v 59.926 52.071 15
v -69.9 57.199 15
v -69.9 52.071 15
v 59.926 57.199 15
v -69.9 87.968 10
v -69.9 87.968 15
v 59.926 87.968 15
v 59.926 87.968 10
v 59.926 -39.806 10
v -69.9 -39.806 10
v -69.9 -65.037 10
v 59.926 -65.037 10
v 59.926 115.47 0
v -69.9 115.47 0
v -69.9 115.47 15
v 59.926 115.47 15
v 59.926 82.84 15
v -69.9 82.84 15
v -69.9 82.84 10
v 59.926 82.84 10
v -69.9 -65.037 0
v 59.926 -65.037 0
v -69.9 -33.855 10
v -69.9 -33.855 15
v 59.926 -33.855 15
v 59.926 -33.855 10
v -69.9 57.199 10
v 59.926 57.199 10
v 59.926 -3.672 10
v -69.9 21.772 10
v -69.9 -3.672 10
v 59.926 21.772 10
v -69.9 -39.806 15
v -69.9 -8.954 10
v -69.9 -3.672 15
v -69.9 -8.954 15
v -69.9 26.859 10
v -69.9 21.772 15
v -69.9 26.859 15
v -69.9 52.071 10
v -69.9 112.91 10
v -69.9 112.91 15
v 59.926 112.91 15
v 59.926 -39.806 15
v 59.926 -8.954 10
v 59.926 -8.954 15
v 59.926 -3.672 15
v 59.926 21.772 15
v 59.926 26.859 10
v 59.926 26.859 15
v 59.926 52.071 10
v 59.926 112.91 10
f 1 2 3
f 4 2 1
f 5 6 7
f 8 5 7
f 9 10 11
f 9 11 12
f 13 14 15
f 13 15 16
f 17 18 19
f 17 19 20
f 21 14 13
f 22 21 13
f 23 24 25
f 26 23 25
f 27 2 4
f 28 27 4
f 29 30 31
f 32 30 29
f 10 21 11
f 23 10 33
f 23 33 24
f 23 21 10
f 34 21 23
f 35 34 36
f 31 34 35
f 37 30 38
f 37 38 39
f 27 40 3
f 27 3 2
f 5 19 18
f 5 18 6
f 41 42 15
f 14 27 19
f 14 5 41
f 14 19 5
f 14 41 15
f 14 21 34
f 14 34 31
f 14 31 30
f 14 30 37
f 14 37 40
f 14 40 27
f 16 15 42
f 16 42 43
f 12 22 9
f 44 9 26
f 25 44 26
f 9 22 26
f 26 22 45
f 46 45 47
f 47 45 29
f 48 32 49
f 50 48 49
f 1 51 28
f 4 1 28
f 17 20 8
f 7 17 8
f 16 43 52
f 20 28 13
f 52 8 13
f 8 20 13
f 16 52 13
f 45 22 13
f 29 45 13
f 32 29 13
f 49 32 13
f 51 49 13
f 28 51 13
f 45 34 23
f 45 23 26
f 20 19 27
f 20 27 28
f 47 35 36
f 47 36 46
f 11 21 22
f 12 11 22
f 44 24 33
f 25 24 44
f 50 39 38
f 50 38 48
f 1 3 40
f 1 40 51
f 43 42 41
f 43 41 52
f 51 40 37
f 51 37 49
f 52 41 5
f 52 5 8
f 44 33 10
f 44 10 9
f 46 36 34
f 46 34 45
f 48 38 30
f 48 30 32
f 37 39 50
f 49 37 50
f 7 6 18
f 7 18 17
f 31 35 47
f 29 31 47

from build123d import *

# Parameters (mm, degrees)
F0_W      = 129.826464
F0_H      = 180.507004
F1_DEPTH  = 15
F2_W      = 129.826464
F2_H      = 25.231384
F4_DEPTH  = 5
F3_W      = 129.826464
F3_H      = 24.901012
F5_DEPTH  = 5
F7_W      = 193.91631
F7_H      = 25.443339
F8_DEPTH  = 5
F9_W      = 129.826464
F9_H      = 24.94248
F9_H_2    = 25.64016
F9_H_3    = 25.21283
F10_DEPTH = 5


with BuildPart() as f1:
    # F0 (on Top) → F1 (new body)
    with BuildSketch(Plane.XY):
        with Locations((-4.98702, 25.216296)):
            Rectangle(F0_W, F0_H)
    extrude(amount=F1_DEPTH)

    # F2 (on face) → F4 (cut)
    with BuildSketch(Plane.XY.offset(15)):
        with Locations((-4.98702, -52.421514)):
            Rectangle(F2_W, F2_H)
    extrude(amount=-F4_DEPTH, mode=Mode.SUBTRACT)

    # F3 (on face) → F5 (cut)
    with BuildSketch(Plane.XY.offset(15)):
        with Locations((-4.98702, -21.404932)):
            Rectangle(F3_W, F3_H)
    extrude(amount=-F5_DEPTH, mode=Mode.SUBTRACT)

    # F7 (on face) → F8 (cut)
    with BuildSketch(Plane.XY.offset(15)):
        with Locations((10.563256, 9.04997)):
            Rectangle(F7_W, F7_H)
    extrude(amount=-F8_DEPTH, mode=Mode.SUBTRACT)

    # F9 (on face) → F10 (cut)
    with BuildSketch(Plane.XY.offset(15)):
        with Locations((-4.98702, 100.438904)):
            Rectangle(F9_W, F9_H)
        with Locations((-4.98702, 70.019551)):
            Rectangle(F9_W, F9_H_2)
        with Locations((-4.98702, 39.465022)):
            Rectangle(F9_W, F9_H_3)
    extrude(amount=-F10_DEPTH, mode=Mode.SUBTRACT)


solid = f1.part
